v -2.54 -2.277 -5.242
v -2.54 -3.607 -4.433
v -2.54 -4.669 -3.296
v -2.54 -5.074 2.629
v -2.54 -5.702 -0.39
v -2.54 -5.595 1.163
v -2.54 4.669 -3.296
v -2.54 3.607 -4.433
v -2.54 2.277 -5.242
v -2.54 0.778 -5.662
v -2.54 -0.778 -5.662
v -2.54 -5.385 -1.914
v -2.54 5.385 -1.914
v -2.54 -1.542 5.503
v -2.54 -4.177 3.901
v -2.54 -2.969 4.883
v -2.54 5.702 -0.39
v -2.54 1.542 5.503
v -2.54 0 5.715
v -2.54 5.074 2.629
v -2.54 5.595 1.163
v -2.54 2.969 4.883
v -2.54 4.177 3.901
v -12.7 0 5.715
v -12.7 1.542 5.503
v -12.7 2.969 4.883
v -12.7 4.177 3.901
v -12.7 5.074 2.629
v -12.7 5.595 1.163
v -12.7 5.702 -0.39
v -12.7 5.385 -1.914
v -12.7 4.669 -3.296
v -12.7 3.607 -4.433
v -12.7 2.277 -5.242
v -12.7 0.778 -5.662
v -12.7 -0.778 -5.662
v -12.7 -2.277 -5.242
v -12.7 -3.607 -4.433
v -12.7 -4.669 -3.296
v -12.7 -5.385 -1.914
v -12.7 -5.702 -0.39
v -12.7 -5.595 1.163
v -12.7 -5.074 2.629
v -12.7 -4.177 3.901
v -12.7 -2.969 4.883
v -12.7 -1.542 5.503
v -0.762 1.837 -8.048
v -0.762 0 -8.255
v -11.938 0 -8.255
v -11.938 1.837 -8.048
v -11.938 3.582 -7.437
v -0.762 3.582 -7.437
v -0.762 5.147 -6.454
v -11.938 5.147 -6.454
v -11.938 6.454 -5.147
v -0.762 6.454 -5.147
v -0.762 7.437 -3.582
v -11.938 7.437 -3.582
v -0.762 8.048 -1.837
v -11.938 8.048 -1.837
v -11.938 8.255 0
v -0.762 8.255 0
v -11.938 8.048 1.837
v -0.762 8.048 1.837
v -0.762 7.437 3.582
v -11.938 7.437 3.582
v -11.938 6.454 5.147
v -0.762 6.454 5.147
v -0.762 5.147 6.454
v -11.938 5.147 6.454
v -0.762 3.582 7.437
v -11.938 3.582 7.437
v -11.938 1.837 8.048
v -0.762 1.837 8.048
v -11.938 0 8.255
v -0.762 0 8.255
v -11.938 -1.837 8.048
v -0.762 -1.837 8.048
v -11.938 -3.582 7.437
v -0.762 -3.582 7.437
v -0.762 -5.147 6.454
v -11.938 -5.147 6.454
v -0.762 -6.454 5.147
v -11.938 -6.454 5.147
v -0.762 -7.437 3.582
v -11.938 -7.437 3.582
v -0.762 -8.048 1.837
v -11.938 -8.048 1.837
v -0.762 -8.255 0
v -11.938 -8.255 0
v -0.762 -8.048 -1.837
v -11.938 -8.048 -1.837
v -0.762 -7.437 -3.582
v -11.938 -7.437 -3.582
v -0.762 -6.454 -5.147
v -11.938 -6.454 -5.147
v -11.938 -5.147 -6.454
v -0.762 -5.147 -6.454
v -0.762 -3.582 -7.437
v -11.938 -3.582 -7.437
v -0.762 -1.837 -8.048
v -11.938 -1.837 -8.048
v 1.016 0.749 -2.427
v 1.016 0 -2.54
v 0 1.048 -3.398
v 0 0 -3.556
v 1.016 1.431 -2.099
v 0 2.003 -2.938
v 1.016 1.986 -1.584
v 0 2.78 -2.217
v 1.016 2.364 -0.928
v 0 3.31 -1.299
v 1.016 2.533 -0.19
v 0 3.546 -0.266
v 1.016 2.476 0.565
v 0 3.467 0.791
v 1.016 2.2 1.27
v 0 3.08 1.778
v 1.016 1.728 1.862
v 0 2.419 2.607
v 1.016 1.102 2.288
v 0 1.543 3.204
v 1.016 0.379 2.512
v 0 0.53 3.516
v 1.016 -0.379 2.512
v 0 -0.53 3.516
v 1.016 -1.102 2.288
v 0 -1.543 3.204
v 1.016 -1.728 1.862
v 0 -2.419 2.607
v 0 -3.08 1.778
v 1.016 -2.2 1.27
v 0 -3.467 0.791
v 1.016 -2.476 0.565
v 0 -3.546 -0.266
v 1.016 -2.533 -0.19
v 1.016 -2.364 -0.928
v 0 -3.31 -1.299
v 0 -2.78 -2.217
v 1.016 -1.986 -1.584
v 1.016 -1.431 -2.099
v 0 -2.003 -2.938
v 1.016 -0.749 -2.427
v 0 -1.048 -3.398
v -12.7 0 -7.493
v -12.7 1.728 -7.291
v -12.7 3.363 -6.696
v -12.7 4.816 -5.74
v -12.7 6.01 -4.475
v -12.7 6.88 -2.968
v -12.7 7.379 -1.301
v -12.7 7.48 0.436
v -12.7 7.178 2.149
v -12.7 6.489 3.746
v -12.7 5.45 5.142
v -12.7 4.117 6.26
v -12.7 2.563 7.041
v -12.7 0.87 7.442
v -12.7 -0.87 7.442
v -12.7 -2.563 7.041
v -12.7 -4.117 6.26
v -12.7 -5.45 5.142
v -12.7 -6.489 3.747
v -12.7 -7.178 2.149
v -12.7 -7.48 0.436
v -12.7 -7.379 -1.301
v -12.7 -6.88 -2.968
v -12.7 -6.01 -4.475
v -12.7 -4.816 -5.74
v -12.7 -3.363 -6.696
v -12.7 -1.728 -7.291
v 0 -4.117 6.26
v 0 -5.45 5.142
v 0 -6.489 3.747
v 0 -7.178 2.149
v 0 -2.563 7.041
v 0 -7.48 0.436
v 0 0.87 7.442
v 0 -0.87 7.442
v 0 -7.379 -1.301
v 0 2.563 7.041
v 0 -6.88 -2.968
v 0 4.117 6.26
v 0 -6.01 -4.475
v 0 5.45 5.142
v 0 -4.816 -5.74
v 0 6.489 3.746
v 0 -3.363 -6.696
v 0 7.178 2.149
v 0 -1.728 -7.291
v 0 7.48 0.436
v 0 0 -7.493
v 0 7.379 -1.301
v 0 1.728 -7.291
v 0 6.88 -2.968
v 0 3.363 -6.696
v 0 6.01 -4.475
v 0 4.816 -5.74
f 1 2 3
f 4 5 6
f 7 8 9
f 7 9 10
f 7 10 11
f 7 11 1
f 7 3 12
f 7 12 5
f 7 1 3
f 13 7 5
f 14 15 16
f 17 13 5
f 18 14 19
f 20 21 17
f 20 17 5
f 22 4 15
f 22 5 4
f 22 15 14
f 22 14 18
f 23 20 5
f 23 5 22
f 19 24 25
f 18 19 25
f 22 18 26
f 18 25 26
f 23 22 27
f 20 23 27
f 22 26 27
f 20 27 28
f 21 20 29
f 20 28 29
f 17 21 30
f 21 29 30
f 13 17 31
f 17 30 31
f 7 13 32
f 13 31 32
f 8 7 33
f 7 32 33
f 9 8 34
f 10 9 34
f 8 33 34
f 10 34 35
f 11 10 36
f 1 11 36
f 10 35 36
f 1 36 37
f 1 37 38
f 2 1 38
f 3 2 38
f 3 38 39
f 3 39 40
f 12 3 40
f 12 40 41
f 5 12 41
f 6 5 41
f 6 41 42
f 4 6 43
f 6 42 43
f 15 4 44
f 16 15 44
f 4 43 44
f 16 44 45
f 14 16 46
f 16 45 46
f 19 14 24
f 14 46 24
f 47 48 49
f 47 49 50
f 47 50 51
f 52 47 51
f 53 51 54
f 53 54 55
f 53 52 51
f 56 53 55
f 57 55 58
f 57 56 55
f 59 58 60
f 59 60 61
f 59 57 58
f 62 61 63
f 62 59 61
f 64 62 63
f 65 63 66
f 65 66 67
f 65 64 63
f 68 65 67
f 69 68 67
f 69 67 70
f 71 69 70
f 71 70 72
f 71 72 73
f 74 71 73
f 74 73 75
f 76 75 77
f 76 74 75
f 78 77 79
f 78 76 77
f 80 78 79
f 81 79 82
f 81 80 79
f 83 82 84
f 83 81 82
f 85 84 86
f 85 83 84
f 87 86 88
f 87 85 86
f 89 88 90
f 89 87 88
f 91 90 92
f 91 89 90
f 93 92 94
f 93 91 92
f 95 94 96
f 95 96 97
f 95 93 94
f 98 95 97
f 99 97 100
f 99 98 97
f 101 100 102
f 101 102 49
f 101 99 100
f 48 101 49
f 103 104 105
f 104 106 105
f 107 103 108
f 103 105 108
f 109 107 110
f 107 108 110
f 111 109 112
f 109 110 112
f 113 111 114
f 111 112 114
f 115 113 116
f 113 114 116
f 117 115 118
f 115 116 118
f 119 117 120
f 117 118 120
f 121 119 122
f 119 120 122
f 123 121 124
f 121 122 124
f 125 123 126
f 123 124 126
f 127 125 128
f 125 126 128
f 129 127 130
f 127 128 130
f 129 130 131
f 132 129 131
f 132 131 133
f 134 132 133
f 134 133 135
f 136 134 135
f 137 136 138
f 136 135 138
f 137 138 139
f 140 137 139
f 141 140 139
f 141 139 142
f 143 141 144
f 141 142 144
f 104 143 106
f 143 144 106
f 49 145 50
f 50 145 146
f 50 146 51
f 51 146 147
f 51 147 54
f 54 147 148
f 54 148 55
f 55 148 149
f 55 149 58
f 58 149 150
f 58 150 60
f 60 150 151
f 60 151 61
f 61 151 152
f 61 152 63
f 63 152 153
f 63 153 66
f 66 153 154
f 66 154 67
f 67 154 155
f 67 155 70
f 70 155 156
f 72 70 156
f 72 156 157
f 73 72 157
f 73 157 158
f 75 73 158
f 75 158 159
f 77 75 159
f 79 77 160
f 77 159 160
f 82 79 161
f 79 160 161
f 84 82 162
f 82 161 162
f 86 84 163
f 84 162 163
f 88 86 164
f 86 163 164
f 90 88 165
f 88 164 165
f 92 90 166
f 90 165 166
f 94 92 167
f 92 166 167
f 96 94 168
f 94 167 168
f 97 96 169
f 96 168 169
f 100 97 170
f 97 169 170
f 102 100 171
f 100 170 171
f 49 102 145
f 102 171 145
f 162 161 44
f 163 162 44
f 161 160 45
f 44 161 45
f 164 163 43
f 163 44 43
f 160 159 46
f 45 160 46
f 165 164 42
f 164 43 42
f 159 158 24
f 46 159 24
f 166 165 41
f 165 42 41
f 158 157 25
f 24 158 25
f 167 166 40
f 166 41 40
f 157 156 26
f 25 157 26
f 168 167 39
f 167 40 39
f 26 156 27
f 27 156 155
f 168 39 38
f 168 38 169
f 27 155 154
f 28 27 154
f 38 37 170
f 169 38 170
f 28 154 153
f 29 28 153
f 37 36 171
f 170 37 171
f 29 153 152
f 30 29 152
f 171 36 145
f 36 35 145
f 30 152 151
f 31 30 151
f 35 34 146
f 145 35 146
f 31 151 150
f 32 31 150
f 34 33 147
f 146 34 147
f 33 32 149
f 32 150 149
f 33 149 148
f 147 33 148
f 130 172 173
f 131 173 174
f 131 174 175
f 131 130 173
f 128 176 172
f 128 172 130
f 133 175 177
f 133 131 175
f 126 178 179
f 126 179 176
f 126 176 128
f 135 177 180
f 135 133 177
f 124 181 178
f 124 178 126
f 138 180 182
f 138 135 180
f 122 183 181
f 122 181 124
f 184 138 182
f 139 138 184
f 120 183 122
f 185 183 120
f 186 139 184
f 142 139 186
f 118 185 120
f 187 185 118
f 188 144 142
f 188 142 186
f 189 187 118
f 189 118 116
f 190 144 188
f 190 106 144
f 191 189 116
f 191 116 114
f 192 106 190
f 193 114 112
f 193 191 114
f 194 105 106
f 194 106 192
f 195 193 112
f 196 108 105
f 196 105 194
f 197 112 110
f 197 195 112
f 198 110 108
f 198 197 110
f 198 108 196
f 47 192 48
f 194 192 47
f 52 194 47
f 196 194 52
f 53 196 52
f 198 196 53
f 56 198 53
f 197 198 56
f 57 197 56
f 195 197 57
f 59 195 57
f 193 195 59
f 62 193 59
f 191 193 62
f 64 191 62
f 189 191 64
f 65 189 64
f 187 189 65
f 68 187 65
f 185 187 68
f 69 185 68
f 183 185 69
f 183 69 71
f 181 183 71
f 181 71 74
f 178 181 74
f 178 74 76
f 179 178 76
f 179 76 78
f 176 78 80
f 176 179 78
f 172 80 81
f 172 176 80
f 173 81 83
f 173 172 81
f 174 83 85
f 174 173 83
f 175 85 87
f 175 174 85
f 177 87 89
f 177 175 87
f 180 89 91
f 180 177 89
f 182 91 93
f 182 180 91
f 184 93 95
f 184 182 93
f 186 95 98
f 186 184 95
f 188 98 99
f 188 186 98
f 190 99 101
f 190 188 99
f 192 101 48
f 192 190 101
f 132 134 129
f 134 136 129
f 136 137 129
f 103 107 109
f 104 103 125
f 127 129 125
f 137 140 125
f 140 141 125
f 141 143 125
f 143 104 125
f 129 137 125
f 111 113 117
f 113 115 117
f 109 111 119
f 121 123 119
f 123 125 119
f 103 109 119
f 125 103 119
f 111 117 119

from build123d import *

# Parameters (mm, degrees)
SKETCH1_R           = 8.255
BOSS_EXTRUDE1_DEPTH = 12.7
SKETCH2_R           = 5.715
CUT_EXTRUDE1_DEPTH  = 10.16
CHAMFER1_SIZE       = 0.762


with BuildPart() as part:
    # Sketch1 → Boss-Extrude1 (new body)
    with BuildSketch(Plane(origin=(0, 0, 0), x_dir=(0, 0, -1), z_dir=(1, 0, 0))):
        Circle(SKETCH1_R)
    extrude(amount=-BOSS_EXTRUDE1_DEPTH)

    # Sketch2 → Cut-Extrude1 (cut)
    with BuildSketch(Plane.ZY.offset(12.7)):
        Circle(SKETCH2_R)
    extrude(amount=-CUT_EXTRUDE1_DEPTH, mode=Mode.SUBTRACT)

    # Chamfer1
    chamfer1_edges = [part.edges().sort_by_distance(p)[0] for p in [
        (0, 0, 8.255),
        (-12.7, 0, 8.255),
    ]]
    chamfer(chamfer1_edges, length=CHAMFER1_SIZE)

    # Sketch3 → Revolve1 (revolve)
    with BuildSketch(Plane(origin=(0, 0, 0), x_dir=(1, 0, 0), z_dir=(0, 1, 0))):
        Polygon((0, 0), (1.016, 0), (1.016, 2.54), (0, 3.556), align=None)
    revolve(axis=Axis((-11.938, 0, 0), (1, 0, 0)))


solid = part.part
